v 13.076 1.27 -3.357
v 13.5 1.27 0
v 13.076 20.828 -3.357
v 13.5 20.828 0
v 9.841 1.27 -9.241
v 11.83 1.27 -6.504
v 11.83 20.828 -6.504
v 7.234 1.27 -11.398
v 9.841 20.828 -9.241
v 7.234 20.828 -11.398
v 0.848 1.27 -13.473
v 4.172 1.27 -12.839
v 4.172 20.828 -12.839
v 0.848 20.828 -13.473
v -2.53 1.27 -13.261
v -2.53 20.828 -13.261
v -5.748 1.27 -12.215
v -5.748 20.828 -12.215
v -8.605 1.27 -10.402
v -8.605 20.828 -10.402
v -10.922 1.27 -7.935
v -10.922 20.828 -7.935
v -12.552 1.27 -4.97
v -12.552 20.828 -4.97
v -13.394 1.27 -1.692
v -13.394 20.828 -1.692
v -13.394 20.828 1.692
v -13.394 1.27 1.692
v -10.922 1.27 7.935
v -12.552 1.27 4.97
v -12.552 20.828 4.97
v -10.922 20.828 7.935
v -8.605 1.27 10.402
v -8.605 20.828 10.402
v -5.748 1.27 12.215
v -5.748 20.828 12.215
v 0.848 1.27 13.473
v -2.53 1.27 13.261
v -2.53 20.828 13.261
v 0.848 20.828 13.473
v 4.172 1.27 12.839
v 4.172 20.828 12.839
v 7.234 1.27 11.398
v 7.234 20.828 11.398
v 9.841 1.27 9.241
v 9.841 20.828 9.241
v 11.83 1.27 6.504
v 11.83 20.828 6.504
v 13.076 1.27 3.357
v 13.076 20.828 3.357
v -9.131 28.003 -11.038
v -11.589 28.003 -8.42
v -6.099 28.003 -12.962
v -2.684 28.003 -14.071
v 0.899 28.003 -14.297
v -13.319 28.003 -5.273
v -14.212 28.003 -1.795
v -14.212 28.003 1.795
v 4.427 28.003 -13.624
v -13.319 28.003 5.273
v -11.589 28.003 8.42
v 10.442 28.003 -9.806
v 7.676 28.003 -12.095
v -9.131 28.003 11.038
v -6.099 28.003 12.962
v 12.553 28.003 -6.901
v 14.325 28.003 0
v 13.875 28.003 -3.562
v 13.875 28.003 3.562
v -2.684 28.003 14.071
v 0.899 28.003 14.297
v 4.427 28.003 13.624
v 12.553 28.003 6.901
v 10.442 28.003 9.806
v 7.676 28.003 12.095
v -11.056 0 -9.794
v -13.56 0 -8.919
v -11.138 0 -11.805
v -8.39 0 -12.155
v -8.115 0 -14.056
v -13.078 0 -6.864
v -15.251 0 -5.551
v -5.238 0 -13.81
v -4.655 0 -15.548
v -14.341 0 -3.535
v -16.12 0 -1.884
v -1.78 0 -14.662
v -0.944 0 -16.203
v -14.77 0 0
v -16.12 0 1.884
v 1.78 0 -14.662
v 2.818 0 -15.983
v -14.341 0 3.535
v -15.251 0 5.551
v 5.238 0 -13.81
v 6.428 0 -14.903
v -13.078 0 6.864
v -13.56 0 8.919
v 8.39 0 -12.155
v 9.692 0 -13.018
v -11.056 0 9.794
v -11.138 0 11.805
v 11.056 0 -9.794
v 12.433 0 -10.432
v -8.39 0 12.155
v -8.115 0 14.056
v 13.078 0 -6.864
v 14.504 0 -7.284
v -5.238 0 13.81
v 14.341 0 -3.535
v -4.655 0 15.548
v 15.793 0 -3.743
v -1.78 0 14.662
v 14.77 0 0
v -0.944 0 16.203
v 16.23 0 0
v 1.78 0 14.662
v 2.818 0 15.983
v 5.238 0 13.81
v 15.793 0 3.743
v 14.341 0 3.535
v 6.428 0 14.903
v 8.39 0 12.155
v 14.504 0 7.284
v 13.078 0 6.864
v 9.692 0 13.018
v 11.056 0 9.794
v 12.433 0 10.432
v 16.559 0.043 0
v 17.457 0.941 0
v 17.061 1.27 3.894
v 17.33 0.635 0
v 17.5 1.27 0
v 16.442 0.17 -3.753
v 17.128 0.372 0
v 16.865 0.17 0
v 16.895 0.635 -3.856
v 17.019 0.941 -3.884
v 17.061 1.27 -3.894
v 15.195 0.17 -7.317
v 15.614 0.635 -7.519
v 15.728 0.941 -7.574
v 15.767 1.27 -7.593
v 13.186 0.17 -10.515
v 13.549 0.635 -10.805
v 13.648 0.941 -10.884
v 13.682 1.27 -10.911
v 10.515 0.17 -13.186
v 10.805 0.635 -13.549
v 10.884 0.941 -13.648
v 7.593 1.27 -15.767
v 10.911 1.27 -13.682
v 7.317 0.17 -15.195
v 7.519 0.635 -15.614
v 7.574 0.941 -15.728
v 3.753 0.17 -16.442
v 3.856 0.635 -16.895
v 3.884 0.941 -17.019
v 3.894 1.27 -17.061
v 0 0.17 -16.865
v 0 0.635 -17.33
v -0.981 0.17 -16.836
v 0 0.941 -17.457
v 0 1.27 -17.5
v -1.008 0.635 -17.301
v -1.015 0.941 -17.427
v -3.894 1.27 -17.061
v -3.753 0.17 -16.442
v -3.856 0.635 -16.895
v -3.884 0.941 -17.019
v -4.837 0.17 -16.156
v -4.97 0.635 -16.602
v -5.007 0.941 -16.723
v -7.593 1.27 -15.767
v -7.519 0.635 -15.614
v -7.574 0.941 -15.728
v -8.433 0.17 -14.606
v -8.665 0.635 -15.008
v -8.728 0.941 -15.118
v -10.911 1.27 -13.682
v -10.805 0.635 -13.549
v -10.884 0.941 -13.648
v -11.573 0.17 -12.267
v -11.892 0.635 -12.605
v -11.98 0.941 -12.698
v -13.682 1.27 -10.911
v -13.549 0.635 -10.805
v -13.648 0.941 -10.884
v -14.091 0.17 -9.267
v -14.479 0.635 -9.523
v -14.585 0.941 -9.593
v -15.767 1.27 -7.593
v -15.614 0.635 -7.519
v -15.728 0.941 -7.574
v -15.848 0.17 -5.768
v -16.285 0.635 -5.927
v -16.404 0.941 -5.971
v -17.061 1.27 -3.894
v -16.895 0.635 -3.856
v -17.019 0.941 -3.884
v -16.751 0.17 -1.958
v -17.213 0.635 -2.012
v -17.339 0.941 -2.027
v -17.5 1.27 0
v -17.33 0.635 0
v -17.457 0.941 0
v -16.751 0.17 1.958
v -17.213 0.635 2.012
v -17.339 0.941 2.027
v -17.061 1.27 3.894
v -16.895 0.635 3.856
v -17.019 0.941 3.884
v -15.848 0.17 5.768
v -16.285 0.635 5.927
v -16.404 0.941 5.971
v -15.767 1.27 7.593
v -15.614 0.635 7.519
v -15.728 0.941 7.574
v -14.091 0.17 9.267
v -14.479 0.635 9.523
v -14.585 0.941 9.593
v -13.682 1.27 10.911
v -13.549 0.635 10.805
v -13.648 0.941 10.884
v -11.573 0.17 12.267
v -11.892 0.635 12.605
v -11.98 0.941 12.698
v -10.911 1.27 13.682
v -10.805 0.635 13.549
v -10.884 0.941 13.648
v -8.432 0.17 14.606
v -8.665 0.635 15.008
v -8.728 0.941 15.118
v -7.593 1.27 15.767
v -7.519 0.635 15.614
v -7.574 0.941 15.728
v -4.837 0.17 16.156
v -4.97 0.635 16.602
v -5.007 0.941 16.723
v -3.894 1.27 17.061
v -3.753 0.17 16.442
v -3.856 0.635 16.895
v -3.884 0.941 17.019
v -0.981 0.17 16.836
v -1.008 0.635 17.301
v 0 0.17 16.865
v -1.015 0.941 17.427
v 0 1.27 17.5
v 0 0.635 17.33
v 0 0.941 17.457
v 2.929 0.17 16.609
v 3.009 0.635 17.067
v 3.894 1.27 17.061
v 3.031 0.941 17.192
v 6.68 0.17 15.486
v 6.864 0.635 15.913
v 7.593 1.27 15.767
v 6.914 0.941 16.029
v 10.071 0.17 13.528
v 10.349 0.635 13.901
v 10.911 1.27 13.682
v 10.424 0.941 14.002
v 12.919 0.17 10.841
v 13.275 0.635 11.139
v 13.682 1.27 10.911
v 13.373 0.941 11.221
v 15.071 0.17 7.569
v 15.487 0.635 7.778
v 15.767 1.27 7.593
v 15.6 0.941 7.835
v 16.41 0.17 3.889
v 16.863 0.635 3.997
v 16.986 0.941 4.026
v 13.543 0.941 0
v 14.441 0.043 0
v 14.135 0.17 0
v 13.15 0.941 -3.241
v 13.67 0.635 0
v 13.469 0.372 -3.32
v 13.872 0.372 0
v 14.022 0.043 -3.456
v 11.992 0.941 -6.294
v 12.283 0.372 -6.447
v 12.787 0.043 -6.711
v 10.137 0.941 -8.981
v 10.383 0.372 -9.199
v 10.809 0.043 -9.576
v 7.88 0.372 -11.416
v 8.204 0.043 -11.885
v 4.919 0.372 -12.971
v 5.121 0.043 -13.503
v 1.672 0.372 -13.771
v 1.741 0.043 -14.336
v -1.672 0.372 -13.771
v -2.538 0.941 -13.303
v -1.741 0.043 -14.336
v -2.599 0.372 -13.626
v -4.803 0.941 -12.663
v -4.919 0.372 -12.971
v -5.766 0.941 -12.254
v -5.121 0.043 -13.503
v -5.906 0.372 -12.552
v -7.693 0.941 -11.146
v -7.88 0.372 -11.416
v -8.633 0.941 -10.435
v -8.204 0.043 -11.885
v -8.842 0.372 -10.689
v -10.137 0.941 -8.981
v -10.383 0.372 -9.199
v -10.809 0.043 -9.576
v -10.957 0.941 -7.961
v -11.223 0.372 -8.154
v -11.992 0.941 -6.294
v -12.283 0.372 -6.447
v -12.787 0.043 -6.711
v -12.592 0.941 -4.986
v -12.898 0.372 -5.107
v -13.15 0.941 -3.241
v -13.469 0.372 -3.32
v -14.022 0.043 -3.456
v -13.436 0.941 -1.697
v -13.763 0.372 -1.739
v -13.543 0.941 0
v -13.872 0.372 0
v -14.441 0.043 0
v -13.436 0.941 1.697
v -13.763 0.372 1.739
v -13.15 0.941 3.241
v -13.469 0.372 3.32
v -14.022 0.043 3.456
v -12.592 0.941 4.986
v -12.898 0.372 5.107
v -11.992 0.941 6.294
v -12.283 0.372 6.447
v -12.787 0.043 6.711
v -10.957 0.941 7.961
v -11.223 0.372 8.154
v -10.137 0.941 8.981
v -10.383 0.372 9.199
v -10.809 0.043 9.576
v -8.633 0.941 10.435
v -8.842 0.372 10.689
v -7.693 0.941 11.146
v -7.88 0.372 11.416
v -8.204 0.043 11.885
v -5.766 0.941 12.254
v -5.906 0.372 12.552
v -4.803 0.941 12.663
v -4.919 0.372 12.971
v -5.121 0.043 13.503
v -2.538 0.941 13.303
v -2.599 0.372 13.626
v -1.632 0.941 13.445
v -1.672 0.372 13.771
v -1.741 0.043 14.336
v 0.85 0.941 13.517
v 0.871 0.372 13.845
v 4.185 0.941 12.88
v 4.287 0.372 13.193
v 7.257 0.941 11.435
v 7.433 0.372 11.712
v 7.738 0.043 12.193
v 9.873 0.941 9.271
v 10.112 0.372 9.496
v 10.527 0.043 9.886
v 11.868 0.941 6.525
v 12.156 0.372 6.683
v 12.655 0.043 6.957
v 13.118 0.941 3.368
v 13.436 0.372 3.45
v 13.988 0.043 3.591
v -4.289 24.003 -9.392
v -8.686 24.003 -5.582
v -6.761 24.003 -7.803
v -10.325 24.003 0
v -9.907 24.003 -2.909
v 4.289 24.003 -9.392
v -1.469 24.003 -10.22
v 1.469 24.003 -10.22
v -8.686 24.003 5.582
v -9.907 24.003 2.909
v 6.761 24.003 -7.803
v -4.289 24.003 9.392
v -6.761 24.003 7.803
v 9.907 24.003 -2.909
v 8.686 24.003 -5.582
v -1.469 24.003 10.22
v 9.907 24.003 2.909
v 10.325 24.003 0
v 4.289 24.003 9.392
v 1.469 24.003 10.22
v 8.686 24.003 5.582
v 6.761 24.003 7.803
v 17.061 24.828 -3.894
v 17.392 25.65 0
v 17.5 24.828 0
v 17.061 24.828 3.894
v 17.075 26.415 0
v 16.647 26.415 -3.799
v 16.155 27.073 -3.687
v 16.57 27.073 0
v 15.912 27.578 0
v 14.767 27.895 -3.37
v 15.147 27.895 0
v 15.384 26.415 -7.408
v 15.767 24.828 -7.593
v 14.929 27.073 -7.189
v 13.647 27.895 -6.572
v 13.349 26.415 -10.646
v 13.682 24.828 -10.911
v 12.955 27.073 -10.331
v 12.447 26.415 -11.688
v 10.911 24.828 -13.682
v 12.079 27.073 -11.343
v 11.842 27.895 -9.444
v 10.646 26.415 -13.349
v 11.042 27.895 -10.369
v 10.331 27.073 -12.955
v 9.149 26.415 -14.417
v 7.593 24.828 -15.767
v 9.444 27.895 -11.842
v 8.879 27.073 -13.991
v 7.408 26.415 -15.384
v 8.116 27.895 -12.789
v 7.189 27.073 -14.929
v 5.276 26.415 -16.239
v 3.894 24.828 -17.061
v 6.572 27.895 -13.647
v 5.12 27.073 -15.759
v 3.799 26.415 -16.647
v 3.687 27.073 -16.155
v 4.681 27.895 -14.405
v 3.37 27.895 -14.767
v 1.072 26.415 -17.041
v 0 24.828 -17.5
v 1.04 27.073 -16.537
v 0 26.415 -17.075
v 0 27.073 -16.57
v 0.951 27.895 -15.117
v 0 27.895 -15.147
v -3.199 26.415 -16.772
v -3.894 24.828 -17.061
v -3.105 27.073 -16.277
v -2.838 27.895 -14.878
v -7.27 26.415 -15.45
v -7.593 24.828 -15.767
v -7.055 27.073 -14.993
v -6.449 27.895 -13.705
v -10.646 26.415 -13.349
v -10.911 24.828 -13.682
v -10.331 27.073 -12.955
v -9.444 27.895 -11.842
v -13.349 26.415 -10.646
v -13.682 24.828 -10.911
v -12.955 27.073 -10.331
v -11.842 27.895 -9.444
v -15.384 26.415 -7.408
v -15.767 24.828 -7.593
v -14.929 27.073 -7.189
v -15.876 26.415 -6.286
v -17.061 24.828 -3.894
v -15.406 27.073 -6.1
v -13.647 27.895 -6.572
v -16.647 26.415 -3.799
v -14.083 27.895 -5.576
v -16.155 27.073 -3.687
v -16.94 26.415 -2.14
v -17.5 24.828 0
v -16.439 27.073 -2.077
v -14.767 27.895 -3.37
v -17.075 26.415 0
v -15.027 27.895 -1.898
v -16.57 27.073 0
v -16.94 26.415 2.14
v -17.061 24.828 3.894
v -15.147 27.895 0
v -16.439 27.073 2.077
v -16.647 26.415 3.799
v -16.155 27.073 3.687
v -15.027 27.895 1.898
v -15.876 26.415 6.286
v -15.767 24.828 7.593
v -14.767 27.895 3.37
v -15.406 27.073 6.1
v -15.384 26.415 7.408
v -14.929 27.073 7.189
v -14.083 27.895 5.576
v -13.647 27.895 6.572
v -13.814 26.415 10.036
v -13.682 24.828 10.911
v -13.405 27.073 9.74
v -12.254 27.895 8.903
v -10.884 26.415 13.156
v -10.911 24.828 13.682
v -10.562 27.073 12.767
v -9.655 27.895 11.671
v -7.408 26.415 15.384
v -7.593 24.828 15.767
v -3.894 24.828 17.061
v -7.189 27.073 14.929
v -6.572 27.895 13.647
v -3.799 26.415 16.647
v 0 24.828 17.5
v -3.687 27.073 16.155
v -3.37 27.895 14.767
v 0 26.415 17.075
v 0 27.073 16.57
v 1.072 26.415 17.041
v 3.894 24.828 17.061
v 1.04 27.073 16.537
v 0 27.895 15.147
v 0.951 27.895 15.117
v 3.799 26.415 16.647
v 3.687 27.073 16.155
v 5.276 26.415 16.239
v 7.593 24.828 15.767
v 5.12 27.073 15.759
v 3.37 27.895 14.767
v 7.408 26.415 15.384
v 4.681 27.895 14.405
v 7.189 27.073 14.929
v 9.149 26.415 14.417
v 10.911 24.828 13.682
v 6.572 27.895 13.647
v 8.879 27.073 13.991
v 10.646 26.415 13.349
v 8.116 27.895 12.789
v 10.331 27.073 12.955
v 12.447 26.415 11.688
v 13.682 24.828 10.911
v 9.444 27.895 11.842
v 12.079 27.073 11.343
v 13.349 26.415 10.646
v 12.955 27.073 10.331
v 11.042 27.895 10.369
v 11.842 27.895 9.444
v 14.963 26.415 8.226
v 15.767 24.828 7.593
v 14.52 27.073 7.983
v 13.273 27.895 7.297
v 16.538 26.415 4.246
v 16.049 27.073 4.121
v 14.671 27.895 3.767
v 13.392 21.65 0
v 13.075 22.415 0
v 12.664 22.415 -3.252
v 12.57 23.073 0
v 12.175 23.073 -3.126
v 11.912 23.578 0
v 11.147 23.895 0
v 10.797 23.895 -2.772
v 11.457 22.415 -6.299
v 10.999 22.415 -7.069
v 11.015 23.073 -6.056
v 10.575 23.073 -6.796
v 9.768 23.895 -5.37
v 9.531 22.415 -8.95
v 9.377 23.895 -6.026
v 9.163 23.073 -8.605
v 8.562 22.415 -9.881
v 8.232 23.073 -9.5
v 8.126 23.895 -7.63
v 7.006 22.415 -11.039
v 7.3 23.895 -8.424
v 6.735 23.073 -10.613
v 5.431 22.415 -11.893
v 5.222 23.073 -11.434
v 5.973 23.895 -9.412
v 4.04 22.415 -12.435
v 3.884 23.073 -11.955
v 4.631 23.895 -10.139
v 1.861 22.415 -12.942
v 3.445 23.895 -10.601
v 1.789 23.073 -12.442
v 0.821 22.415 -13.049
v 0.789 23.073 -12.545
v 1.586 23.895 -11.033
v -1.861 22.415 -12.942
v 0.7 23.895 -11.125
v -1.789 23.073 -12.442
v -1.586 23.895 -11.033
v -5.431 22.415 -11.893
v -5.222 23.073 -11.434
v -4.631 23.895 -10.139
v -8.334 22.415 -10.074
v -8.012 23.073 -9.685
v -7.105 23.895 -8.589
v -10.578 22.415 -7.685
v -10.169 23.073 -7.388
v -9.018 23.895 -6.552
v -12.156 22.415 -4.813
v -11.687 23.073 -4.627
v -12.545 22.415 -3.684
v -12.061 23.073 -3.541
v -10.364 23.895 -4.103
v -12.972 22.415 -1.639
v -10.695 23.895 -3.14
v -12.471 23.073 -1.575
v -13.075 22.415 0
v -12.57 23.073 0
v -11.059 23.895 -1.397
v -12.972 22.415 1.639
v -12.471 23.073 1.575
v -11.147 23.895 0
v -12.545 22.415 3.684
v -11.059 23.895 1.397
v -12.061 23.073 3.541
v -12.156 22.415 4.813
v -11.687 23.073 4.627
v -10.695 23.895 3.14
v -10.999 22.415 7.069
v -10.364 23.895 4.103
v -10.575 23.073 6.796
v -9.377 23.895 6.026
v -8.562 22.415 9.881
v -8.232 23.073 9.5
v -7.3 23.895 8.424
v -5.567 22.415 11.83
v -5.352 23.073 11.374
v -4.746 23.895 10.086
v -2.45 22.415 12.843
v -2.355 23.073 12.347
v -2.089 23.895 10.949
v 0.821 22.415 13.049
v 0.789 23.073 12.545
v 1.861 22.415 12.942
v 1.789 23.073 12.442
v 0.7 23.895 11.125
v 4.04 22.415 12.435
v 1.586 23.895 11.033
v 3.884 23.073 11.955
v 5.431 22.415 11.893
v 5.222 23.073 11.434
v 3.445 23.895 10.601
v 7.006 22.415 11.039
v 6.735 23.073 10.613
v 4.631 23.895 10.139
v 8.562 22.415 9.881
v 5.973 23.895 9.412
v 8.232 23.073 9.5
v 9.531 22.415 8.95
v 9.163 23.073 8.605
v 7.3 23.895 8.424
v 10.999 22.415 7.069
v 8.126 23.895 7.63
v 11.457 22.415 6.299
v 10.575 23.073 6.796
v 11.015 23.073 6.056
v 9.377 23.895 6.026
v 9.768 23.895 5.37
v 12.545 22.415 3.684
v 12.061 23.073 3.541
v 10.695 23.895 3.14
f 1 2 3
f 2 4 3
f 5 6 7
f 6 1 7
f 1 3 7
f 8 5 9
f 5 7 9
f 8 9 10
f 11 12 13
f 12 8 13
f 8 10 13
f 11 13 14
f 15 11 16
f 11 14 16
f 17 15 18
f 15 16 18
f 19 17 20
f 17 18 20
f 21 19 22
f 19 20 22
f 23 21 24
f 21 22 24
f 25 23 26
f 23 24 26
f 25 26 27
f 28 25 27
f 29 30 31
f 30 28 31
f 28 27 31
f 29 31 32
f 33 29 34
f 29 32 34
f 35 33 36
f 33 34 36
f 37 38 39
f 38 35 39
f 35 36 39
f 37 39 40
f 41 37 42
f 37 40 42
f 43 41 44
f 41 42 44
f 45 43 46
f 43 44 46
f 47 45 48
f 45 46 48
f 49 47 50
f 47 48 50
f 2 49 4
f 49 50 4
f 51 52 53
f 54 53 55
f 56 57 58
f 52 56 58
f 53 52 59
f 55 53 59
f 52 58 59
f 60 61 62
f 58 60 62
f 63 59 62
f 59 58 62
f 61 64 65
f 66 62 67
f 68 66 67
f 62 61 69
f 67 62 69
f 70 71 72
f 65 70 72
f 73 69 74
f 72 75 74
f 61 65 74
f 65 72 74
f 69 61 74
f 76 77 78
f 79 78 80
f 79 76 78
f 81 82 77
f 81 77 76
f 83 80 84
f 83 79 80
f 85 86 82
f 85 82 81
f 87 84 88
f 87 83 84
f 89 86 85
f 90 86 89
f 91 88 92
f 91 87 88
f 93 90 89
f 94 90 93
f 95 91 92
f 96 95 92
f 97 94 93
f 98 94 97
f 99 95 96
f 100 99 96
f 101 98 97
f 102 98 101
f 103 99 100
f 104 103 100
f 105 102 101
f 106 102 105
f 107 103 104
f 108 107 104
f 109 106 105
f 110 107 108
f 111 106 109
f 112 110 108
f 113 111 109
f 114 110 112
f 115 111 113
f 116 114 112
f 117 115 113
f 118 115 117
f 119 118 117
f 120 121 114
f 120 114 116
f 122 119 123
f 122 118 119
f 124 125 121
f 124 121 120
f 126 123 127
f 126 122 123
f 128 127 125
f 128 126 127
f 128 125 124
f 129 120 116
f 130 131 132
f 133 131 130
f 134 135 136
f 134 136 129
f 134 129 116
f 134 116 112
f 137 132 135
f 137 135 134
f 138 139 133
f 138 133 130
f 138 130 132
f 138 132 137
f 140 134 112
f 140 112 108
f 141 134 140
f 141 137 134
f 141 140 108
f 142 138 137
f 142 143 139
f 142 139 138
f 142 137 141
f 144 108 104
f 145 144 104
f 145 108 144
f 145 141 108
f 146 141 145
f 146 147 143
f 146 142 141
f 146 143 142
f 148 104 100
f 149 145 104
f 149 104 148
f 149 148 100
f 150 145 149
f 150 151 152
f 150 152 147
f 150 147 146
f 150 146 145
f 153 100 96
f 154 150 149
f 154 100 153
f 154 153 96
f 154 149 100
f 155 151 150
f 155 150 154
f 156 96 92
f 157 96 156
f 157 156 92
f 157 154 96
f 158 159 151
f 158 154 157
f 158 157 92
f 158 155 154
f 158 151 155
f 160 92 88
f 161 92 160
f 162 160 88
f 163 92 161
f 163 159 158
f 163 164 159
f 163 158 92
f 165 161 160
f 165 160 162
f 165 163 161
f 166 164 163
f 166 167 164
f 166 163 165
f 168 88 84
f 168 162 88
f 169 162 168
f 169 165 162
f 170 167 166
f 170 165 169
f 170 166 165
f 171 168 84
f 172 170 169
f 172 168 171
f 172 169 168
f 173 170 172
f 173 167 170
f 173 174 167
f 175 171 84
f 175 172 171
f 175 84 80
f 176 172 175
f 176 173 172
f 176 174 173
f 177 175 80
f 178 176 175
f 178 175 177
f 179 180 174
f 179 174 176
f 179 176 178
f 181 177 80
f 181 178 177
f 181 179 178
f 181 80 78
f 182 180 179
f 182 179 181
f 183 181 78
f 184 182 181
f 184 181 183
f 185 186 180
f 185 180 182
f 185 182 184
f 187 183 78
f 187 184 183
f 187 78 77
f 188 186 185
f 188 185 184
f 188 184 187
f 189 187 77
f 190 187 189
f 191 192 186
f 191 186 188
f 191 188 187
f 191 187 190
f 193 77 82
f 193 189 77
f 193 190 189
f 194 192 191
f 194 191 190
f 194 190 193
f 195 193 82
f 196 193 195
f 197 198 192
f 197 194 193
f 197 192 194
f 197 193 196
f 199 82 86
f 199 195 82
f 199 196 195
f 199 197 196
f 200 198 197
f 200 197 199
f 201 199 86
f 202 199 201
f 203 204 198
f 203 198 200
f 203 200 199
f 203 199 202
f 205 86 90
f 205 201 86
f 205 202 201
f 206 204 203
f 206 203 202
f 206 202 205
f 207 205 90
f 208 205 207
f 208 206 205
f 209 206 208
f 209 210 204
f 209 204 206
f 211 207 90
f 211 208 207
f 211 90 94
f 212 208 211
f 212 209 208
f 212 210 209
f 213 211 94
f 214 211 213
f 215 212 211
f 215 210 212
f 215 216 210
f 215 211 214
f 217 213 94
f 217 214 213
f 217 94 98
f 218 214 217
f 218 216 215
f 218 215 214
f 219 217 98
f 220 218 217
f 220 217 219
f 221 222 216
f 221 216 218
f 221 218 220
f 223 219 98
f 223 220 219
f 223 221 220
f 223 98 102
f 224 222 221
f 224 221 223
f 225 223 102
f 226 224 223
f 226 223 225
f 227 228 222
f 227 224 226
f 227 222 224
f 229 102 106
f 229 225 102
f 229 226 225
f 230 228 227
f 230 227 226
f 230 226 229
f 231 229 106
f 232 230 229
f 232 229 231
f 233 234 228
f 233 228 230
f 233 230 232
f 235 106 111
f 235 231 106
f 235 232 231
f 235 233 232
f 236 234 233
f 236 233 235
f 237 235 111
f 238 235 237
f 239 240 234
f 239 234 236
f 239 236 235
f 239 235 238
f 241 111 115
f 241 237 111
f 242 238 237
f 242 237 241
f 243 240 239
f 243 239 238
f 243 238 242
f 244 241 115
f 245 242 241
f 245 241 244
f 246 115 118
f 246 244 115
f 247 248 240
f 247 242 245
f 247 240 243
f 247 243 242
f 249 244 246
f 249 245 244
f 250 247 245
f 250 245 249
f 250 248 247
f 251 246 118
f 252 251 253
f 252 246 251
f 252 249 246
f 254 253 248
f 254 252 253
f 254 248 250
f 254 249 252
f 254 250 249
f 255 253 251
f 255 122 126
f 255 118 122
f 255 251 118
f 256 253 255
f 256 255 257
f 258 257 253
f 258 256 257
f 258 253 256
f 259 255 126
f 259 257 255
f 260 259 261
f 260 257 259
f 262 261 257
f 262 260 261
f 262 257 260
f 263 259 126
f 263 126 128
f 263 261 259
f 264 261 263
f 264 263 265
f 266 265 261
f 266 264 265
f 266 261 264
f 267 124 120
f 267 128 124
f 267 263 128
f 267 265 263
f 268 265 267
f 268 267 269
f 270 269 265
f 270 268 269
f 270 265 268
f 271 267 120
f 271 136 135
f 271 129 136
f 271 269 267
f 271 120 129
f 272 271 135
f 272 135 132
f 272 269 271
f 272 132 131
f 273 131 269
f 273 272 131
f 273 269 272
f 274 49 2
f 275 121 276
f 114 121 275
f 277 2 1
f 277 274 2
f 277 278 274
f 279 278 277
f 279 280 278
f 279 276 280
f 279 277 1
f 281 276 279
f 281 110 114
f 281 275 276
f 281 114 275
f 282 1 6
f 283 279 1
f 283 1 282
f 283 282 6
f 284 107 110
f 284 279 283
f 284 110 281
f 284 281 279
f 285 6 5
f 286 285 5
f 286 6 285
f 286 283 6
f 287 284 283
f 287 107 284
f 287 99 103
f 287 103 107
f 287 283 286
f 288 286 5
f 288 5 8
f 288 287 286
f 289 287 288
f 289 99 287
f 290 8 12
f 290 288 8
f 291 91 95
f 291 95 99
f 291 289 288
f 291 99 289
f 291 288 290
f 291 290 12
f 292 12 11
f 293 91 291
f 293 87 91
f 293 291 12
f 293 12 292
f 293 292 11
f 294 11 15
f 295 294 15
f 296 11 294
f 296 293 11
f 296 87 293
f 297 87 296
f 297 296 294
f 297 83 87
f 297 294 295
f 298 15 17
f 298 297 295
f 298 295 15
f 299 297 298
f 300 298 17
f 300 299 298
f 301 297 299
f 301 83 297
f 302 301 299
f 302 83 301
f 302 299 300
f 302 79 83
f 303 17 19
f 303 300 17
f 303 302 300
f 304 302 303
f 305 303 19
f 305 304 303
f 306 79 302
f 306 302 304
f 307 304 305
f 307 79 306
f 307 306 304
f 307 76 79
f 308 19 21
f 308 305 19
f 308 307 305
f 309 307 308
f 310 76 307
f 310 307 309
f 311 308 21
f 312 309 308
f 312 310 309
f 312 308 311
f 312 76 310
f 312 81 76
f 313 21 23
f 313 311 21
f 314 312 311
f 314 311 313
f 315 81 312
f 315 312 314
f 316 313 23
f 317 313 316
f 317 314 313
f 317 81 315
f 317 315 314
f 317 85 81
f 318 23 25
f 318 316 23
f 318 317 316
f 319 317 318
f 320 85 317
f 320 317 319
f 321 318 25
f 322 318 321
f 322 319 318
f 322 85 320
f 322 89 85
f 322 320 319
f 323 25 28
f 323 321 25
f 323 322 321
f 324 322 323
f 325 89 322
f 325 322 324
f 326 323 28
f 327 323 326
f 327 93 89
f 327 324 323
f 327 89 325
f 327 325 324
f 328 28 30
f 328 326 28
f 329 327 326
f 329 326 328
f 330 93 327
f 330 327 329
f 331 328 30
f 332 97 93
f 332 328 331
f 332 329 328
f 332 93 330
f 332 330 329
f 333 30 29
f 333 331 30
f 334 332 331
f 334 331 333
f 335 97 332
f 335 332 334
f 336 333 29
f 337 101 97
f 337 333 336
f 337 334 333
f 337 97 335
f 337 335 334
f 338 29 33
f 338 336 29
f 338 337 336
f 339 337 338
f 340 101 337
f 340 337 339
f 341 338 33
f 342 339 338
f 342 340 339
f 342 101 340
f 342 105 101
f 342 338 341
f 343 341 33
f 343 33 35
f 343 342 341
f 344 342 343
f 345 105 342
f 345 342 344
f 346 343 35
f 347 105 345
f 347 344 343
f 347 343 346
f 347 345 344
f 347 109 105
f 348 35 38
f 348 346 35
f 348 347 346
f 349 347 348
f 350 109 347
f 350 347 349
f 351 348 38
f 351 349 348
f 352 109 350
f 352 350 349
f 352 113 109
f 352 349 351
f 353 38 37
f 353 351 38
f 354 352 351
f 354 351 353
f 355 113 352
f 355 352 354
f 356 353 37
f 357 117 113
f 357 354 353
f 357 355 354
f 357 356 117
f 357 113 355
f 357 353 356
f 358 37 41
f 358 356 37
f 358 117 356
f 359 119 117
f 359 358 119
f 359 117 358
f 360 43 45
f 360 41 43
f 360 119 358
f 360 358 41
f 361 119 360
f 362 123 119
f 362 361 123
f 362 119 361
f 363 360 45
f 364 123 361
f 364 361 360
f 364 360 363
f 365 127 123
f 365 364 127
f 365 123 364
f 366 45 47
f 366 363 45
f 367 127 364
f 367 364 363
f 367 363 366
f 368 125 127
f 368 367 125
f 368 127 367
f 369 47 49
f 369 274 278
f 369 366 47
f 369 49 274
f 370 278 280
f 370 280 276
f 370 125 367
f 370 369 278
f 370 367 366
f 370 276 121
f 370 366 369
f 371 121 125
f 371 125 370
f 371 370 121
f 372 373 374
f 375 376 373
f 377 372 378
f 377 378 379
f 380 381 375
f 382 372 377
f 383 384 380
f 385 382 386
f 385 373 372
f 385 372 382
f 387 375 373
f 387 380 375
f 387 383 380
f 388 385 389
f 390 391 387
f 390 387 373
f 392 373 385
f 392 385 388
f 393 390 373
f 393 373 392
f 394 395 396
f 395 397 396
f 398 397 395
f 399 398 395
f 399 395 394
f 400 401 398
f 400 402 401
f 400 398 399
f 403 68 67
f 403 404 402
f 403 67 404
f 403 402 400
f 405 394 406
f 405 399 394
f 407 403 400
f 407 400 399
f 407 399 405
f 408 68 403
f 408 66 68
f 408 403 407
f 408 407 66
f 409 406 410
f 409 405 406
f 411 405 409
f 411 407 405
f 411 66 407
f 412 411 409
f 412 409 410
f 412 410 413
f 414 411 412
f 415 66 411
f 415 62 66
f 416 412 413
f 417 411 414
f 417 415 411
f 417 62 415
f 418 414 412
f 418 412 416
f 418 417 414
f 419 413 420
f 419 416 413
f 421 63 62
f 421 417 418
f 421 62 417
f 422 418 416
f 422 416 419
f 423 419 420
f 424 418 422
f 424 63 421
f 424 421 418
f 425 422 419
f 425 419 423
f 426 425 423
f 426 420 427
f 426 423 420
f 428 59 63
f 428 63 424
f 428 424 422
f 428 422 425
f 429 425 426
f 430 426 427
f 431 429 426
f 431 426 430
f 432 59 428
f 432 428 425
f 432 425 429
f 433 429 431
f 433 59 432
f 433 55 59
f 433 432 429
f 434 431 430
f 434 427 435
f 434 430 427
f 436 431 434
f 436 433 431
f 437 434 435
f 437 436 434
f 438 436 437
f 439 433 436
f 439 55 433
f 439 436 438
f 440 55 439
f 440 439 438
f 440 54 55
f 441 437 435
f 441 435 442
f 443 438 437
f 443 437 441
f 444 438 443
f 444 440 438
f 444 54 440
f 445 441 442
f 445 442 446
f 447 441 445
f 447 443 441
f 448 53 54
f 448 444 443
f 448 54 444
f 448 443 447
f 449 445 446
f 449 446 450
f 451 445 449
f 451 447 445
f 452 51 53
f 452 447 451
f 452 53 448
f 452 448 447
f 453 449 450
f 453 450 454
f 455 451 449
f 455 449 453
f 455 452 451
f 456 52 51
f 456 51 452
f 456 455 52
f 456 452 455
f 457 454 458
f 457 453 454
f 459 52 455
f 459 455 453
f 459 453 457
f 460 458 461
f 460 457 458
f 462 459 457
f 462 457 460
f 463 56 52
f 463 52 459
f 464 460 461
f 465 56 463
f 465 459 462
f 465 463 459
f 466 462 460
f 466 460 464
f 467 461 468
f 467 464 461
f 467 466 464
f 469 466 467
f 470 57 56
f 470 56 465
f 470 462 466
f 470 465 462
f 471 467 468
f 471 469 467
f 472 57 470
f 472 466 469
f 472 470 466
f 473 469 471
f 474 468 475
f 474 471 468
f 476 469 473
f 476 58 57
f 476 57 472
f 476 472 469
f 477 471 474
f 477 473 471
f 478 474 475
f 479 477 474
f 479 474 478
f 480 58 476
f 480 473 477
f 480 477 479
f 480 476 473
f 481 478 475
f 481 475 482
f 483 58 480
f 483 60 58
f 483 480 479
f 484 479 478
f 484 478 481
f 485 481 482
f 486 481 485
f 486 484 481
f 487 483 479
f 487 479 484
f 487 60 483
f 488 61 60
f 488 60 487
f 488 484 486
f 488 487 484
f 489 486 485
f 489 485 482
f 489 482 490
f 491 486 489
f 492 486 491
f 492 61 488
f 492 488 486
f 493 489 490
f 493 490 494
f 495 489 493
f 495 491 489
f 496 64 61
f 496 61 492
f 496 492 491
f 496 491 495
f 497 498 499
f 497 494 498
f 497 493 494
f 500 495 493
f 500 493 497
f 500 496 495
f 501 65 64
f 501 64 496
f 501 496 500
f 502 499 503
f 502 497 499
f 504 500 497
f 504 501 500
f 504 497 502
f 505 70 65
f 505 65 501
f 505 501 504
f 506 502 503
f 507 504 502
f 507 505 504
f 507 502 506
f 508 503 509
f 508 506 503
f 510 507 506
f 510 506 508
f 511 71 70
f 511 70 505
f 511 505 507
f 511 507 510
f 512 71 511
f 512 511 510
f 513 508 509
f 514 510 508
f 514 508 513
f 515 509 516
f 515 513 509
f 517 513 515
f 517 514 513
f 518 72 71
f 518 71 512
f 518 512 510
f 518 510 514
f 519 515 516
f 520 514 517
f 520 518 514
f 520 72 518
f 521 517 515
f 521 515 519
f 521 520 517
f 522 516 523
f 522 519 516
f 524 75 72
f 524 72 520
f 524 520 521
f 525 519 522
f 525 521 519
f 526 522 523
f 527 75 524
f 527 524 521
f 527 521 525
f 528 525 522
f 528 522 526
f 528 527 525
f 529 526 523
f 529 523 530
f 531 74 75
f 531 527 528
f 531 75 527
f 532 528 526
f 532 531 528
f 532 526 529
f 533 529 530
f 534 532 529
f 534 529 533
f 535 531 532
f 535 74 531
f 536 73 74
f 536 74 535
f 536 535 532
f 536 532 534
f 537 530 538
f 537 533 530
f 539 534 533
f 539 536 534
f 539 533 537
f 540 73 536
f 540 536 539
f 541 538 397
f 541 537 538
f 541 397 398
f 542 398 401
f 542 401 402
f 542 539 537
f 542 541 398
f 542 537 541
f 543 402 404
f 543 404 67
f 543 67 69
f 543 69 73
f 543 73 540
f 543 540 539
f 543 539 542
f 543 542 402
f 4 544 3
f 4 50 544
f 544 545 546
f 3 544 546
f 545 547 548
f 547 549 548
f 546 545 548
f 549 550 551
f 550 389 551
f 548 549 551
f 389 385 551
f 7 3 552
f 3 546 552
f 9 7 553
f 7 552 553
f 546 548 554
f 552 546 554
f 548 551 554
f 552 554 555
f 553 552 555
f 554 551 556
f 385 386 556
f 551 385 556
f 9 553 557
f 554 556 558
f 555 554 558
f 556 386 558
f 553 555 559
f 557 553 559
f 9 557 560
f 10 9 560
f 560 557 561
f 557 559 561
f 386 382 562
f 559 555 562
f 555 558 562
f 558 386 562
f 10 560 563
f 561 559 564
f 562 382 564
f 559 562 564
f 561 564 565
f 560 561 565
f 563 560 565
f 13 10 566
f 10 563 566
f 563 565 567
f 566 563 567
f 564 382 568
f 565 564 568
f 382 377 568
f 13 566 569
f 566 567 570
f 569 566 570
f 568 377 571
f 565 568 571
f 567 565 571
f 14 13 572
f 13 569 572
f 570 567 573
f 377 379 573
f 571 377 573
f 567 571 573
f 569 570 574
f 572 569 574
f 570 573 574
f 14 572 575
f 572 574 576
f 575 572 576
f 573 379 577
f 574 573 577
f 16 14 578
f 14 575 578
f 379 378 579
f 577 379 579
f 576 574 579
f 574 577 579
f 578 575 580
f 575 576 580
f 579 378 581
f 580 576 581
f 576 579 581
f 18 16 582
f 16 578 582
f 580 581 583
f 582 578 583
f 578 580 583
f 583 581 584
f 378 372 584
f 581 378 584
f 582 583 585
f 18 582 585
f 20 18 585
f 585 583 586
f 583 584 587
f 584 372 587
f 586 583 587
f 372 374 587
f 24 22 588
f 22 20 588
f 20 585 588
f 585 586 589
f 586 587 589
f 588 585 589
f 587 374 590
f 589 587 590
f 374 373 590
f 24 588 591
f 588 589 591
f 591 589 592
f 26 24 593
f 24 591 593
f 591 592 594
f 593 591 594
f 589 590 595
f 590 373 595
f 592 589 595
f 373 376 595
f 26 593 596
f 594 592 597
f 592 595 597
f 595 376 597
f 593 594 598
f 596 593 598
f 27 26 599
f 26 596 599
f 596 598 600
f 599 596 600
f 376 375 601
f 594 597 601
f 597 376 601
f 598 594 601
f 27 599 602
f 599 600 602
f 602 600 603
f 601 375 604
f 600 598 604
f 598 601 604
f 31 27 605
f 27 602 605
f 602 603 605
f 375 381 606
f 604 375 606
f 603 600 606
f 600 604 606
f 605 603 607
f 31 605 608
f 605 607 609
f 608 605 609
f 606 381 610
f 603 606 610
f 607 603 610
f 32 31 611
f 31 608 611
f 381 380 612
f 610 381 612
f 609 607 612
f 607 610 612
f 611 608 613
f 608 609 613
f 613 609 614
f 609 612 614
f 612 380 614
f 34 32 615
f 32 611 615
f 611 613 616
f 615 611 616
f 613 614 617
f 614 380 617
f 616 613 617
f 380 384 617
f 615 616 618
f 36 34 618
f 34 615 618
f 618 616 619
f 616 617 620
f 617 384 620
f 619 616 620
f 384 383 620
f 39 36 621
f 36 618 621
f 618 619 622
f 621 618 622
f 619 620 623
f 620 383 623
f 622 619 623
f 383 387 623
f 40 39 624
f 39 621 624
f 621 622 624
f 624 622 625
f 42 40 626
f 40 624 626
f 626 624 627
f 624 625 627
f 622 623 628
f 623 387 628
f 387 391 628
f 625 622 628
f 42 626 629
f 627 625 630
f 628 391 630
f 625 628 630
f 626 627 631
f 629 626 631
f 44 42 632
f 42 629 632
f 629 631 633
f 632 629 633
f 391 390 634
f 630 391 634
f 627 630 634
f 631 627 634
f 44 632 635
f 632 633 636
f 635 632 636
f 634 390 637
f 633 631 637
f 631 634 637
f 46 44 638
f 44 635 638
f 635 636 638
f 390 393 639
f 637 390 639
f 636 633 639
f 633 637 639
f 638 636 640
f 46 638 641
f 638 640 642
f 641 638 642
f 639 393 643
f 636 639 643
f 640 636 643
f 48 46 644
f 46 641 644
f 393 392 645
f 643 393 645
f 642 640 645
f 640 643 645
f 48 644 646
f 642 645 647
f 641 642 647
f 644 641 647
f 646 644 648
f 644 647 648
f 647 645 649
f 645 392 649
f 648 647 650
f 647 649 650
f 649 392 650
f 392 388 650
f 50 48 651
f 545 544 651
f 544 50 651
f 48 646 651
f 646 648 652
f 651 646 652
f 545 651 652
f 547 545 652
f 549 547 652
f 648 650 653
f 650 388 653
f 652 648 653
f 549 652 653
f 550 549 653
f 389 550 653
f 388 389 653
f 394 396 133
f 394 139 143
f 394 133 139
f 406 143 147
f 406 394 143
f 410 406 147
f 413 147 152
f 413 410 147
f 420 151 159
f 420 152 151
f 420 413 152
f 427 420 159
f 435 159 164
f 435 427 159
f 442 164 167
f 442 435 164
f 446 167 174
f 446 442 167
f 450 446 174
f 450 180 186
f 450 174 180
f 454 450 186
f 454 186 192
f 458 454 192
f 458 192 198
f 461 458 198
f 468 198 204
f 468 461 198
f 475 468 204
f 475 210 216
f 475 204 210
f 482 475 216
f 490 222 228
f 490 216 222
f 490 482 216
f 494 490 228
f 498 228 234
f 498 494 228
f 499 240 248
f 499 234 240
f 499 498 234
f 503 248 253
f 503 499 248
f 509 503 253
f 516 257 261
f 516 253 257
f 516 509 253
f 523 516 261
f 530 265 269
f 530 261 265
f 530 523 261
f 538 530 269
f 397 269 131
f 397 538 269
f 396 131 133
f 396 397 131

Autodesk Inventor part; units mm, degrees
ref_plane "YZ Plane" through (0, 0, 0) normal (1, 0, 0) x (0, 1, 0)
ref_plane "XZ Plane" through (0, 0, 0) normal (0, 1, 0) x (-1, 0, 0)
ref_plane "XY Plane" through (0, 0, 0) normal (0, 0, 1) x (1, 0, 0)
sketch "Boceto1" plane through (0, 0, 0) normal (0, 0, 1) x (1, 0, 0)
  circle A0 centre (0, 0) radius 13.5
  circle A1 centre (0, 0) radius 17.5
  line L0 (17.5, 1.27) -> (17.5, 24.003)
  line L1 (13.5, 1.27) -> (13.5, 20.828)
  line L2 (10.325, 24.003) -> (0, 24.003)
  line L3 (17.5, 24.003) -> (17.5, 24.828)
  line L4 (14.325, 28.003) -> (0, 28.003)
  line L5 (0, 28.003) -> (0, 0)
  arc A2 (17.5, 24.828) -> (14.325, 28.003) centre (14.325, 24.828) ccw
  arc A3 (13.5, 20.828) -> (10.325, 24.003) centre (10.325, 20.828) ccw
  line L6 (16.23, 0) -> (14.77, 0)
  arc A4 (16.23, 0) -> (17.5, 1.27) centre (16.23, 1.27) ccw
  arc A5 (13.5, 1.27) -> (14.77, 0) centre (14.77, 1.27) ccw
  point P0 (17.5, 0)
  point P1 (13.5, 0)
  point P2 (17.5, 28.003)
  dimension "d0" = 27
  dimension "d1" = 35
  dimension "d2" = 24.003
  dimension "d3" = 4
  dimension "d4" = 3.175
  dimension "d5" = 1.27
revolve "Revolución1" add sketch "Boceto1" angle 360 about axis through (0, 28.003, 0) along (0, -1, 0) picked at (14.1771, 6.8232) contours L1 A3 L2 L5 L4 A2 L3 L0 A4 A1 | A1 A4 L6 A5 L1
properties part number "tapap"
